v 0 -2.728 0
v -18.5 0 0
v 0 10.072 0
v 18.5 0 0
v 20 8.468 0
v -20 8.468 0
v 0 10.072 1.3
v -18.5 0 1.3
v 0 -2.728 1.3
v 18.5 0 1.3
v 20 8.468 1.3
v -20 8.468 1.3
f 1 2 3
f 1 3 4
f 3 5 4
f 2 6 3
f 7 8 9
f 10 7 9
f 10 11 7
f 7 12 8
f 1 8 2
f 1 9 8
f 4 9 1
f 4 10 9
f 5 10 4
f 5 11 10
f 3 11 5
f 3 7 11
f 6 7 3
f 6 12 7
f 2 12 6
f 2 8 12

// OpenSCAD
/* Tab Variables */
fn = 36;
$fn = fn;
//thickness
t = 0.3+0.2*5;

//abstand oben breite
wo = 40; //c in diagram
c = wo;
//unten
wu = 37.0; //a in dia
a = wu;
//abstand oben unten ecken
aou = 8.6;
b = aou;
//aou mitte
aoum = 12.8;
e = aoum;
//d
d = (c-a)/2;
f = sqrt(b*b-d*d);
//u
u = 18.7;
//v
v = a/2;
//w
w=sqrt(u*u-v*v);
//x
x = e-w-f;
//y
y = c/2;
//z
z=sqrt(x*x+y*y);

echo(f);
echo(w);
echo(v);

module half()
{
rotate([0,180,0])
square([v ,f]);
polygon([[0,0],[0,-w],[-v,0]]);
polygon([[-v,0],[-y,f],[-v,f]]);
polygon([[-y,f],[0,f],[0,e-w]]);
}
linear_extrude(height=t)
{
half();
rotate([0,180,0])
half();
}
